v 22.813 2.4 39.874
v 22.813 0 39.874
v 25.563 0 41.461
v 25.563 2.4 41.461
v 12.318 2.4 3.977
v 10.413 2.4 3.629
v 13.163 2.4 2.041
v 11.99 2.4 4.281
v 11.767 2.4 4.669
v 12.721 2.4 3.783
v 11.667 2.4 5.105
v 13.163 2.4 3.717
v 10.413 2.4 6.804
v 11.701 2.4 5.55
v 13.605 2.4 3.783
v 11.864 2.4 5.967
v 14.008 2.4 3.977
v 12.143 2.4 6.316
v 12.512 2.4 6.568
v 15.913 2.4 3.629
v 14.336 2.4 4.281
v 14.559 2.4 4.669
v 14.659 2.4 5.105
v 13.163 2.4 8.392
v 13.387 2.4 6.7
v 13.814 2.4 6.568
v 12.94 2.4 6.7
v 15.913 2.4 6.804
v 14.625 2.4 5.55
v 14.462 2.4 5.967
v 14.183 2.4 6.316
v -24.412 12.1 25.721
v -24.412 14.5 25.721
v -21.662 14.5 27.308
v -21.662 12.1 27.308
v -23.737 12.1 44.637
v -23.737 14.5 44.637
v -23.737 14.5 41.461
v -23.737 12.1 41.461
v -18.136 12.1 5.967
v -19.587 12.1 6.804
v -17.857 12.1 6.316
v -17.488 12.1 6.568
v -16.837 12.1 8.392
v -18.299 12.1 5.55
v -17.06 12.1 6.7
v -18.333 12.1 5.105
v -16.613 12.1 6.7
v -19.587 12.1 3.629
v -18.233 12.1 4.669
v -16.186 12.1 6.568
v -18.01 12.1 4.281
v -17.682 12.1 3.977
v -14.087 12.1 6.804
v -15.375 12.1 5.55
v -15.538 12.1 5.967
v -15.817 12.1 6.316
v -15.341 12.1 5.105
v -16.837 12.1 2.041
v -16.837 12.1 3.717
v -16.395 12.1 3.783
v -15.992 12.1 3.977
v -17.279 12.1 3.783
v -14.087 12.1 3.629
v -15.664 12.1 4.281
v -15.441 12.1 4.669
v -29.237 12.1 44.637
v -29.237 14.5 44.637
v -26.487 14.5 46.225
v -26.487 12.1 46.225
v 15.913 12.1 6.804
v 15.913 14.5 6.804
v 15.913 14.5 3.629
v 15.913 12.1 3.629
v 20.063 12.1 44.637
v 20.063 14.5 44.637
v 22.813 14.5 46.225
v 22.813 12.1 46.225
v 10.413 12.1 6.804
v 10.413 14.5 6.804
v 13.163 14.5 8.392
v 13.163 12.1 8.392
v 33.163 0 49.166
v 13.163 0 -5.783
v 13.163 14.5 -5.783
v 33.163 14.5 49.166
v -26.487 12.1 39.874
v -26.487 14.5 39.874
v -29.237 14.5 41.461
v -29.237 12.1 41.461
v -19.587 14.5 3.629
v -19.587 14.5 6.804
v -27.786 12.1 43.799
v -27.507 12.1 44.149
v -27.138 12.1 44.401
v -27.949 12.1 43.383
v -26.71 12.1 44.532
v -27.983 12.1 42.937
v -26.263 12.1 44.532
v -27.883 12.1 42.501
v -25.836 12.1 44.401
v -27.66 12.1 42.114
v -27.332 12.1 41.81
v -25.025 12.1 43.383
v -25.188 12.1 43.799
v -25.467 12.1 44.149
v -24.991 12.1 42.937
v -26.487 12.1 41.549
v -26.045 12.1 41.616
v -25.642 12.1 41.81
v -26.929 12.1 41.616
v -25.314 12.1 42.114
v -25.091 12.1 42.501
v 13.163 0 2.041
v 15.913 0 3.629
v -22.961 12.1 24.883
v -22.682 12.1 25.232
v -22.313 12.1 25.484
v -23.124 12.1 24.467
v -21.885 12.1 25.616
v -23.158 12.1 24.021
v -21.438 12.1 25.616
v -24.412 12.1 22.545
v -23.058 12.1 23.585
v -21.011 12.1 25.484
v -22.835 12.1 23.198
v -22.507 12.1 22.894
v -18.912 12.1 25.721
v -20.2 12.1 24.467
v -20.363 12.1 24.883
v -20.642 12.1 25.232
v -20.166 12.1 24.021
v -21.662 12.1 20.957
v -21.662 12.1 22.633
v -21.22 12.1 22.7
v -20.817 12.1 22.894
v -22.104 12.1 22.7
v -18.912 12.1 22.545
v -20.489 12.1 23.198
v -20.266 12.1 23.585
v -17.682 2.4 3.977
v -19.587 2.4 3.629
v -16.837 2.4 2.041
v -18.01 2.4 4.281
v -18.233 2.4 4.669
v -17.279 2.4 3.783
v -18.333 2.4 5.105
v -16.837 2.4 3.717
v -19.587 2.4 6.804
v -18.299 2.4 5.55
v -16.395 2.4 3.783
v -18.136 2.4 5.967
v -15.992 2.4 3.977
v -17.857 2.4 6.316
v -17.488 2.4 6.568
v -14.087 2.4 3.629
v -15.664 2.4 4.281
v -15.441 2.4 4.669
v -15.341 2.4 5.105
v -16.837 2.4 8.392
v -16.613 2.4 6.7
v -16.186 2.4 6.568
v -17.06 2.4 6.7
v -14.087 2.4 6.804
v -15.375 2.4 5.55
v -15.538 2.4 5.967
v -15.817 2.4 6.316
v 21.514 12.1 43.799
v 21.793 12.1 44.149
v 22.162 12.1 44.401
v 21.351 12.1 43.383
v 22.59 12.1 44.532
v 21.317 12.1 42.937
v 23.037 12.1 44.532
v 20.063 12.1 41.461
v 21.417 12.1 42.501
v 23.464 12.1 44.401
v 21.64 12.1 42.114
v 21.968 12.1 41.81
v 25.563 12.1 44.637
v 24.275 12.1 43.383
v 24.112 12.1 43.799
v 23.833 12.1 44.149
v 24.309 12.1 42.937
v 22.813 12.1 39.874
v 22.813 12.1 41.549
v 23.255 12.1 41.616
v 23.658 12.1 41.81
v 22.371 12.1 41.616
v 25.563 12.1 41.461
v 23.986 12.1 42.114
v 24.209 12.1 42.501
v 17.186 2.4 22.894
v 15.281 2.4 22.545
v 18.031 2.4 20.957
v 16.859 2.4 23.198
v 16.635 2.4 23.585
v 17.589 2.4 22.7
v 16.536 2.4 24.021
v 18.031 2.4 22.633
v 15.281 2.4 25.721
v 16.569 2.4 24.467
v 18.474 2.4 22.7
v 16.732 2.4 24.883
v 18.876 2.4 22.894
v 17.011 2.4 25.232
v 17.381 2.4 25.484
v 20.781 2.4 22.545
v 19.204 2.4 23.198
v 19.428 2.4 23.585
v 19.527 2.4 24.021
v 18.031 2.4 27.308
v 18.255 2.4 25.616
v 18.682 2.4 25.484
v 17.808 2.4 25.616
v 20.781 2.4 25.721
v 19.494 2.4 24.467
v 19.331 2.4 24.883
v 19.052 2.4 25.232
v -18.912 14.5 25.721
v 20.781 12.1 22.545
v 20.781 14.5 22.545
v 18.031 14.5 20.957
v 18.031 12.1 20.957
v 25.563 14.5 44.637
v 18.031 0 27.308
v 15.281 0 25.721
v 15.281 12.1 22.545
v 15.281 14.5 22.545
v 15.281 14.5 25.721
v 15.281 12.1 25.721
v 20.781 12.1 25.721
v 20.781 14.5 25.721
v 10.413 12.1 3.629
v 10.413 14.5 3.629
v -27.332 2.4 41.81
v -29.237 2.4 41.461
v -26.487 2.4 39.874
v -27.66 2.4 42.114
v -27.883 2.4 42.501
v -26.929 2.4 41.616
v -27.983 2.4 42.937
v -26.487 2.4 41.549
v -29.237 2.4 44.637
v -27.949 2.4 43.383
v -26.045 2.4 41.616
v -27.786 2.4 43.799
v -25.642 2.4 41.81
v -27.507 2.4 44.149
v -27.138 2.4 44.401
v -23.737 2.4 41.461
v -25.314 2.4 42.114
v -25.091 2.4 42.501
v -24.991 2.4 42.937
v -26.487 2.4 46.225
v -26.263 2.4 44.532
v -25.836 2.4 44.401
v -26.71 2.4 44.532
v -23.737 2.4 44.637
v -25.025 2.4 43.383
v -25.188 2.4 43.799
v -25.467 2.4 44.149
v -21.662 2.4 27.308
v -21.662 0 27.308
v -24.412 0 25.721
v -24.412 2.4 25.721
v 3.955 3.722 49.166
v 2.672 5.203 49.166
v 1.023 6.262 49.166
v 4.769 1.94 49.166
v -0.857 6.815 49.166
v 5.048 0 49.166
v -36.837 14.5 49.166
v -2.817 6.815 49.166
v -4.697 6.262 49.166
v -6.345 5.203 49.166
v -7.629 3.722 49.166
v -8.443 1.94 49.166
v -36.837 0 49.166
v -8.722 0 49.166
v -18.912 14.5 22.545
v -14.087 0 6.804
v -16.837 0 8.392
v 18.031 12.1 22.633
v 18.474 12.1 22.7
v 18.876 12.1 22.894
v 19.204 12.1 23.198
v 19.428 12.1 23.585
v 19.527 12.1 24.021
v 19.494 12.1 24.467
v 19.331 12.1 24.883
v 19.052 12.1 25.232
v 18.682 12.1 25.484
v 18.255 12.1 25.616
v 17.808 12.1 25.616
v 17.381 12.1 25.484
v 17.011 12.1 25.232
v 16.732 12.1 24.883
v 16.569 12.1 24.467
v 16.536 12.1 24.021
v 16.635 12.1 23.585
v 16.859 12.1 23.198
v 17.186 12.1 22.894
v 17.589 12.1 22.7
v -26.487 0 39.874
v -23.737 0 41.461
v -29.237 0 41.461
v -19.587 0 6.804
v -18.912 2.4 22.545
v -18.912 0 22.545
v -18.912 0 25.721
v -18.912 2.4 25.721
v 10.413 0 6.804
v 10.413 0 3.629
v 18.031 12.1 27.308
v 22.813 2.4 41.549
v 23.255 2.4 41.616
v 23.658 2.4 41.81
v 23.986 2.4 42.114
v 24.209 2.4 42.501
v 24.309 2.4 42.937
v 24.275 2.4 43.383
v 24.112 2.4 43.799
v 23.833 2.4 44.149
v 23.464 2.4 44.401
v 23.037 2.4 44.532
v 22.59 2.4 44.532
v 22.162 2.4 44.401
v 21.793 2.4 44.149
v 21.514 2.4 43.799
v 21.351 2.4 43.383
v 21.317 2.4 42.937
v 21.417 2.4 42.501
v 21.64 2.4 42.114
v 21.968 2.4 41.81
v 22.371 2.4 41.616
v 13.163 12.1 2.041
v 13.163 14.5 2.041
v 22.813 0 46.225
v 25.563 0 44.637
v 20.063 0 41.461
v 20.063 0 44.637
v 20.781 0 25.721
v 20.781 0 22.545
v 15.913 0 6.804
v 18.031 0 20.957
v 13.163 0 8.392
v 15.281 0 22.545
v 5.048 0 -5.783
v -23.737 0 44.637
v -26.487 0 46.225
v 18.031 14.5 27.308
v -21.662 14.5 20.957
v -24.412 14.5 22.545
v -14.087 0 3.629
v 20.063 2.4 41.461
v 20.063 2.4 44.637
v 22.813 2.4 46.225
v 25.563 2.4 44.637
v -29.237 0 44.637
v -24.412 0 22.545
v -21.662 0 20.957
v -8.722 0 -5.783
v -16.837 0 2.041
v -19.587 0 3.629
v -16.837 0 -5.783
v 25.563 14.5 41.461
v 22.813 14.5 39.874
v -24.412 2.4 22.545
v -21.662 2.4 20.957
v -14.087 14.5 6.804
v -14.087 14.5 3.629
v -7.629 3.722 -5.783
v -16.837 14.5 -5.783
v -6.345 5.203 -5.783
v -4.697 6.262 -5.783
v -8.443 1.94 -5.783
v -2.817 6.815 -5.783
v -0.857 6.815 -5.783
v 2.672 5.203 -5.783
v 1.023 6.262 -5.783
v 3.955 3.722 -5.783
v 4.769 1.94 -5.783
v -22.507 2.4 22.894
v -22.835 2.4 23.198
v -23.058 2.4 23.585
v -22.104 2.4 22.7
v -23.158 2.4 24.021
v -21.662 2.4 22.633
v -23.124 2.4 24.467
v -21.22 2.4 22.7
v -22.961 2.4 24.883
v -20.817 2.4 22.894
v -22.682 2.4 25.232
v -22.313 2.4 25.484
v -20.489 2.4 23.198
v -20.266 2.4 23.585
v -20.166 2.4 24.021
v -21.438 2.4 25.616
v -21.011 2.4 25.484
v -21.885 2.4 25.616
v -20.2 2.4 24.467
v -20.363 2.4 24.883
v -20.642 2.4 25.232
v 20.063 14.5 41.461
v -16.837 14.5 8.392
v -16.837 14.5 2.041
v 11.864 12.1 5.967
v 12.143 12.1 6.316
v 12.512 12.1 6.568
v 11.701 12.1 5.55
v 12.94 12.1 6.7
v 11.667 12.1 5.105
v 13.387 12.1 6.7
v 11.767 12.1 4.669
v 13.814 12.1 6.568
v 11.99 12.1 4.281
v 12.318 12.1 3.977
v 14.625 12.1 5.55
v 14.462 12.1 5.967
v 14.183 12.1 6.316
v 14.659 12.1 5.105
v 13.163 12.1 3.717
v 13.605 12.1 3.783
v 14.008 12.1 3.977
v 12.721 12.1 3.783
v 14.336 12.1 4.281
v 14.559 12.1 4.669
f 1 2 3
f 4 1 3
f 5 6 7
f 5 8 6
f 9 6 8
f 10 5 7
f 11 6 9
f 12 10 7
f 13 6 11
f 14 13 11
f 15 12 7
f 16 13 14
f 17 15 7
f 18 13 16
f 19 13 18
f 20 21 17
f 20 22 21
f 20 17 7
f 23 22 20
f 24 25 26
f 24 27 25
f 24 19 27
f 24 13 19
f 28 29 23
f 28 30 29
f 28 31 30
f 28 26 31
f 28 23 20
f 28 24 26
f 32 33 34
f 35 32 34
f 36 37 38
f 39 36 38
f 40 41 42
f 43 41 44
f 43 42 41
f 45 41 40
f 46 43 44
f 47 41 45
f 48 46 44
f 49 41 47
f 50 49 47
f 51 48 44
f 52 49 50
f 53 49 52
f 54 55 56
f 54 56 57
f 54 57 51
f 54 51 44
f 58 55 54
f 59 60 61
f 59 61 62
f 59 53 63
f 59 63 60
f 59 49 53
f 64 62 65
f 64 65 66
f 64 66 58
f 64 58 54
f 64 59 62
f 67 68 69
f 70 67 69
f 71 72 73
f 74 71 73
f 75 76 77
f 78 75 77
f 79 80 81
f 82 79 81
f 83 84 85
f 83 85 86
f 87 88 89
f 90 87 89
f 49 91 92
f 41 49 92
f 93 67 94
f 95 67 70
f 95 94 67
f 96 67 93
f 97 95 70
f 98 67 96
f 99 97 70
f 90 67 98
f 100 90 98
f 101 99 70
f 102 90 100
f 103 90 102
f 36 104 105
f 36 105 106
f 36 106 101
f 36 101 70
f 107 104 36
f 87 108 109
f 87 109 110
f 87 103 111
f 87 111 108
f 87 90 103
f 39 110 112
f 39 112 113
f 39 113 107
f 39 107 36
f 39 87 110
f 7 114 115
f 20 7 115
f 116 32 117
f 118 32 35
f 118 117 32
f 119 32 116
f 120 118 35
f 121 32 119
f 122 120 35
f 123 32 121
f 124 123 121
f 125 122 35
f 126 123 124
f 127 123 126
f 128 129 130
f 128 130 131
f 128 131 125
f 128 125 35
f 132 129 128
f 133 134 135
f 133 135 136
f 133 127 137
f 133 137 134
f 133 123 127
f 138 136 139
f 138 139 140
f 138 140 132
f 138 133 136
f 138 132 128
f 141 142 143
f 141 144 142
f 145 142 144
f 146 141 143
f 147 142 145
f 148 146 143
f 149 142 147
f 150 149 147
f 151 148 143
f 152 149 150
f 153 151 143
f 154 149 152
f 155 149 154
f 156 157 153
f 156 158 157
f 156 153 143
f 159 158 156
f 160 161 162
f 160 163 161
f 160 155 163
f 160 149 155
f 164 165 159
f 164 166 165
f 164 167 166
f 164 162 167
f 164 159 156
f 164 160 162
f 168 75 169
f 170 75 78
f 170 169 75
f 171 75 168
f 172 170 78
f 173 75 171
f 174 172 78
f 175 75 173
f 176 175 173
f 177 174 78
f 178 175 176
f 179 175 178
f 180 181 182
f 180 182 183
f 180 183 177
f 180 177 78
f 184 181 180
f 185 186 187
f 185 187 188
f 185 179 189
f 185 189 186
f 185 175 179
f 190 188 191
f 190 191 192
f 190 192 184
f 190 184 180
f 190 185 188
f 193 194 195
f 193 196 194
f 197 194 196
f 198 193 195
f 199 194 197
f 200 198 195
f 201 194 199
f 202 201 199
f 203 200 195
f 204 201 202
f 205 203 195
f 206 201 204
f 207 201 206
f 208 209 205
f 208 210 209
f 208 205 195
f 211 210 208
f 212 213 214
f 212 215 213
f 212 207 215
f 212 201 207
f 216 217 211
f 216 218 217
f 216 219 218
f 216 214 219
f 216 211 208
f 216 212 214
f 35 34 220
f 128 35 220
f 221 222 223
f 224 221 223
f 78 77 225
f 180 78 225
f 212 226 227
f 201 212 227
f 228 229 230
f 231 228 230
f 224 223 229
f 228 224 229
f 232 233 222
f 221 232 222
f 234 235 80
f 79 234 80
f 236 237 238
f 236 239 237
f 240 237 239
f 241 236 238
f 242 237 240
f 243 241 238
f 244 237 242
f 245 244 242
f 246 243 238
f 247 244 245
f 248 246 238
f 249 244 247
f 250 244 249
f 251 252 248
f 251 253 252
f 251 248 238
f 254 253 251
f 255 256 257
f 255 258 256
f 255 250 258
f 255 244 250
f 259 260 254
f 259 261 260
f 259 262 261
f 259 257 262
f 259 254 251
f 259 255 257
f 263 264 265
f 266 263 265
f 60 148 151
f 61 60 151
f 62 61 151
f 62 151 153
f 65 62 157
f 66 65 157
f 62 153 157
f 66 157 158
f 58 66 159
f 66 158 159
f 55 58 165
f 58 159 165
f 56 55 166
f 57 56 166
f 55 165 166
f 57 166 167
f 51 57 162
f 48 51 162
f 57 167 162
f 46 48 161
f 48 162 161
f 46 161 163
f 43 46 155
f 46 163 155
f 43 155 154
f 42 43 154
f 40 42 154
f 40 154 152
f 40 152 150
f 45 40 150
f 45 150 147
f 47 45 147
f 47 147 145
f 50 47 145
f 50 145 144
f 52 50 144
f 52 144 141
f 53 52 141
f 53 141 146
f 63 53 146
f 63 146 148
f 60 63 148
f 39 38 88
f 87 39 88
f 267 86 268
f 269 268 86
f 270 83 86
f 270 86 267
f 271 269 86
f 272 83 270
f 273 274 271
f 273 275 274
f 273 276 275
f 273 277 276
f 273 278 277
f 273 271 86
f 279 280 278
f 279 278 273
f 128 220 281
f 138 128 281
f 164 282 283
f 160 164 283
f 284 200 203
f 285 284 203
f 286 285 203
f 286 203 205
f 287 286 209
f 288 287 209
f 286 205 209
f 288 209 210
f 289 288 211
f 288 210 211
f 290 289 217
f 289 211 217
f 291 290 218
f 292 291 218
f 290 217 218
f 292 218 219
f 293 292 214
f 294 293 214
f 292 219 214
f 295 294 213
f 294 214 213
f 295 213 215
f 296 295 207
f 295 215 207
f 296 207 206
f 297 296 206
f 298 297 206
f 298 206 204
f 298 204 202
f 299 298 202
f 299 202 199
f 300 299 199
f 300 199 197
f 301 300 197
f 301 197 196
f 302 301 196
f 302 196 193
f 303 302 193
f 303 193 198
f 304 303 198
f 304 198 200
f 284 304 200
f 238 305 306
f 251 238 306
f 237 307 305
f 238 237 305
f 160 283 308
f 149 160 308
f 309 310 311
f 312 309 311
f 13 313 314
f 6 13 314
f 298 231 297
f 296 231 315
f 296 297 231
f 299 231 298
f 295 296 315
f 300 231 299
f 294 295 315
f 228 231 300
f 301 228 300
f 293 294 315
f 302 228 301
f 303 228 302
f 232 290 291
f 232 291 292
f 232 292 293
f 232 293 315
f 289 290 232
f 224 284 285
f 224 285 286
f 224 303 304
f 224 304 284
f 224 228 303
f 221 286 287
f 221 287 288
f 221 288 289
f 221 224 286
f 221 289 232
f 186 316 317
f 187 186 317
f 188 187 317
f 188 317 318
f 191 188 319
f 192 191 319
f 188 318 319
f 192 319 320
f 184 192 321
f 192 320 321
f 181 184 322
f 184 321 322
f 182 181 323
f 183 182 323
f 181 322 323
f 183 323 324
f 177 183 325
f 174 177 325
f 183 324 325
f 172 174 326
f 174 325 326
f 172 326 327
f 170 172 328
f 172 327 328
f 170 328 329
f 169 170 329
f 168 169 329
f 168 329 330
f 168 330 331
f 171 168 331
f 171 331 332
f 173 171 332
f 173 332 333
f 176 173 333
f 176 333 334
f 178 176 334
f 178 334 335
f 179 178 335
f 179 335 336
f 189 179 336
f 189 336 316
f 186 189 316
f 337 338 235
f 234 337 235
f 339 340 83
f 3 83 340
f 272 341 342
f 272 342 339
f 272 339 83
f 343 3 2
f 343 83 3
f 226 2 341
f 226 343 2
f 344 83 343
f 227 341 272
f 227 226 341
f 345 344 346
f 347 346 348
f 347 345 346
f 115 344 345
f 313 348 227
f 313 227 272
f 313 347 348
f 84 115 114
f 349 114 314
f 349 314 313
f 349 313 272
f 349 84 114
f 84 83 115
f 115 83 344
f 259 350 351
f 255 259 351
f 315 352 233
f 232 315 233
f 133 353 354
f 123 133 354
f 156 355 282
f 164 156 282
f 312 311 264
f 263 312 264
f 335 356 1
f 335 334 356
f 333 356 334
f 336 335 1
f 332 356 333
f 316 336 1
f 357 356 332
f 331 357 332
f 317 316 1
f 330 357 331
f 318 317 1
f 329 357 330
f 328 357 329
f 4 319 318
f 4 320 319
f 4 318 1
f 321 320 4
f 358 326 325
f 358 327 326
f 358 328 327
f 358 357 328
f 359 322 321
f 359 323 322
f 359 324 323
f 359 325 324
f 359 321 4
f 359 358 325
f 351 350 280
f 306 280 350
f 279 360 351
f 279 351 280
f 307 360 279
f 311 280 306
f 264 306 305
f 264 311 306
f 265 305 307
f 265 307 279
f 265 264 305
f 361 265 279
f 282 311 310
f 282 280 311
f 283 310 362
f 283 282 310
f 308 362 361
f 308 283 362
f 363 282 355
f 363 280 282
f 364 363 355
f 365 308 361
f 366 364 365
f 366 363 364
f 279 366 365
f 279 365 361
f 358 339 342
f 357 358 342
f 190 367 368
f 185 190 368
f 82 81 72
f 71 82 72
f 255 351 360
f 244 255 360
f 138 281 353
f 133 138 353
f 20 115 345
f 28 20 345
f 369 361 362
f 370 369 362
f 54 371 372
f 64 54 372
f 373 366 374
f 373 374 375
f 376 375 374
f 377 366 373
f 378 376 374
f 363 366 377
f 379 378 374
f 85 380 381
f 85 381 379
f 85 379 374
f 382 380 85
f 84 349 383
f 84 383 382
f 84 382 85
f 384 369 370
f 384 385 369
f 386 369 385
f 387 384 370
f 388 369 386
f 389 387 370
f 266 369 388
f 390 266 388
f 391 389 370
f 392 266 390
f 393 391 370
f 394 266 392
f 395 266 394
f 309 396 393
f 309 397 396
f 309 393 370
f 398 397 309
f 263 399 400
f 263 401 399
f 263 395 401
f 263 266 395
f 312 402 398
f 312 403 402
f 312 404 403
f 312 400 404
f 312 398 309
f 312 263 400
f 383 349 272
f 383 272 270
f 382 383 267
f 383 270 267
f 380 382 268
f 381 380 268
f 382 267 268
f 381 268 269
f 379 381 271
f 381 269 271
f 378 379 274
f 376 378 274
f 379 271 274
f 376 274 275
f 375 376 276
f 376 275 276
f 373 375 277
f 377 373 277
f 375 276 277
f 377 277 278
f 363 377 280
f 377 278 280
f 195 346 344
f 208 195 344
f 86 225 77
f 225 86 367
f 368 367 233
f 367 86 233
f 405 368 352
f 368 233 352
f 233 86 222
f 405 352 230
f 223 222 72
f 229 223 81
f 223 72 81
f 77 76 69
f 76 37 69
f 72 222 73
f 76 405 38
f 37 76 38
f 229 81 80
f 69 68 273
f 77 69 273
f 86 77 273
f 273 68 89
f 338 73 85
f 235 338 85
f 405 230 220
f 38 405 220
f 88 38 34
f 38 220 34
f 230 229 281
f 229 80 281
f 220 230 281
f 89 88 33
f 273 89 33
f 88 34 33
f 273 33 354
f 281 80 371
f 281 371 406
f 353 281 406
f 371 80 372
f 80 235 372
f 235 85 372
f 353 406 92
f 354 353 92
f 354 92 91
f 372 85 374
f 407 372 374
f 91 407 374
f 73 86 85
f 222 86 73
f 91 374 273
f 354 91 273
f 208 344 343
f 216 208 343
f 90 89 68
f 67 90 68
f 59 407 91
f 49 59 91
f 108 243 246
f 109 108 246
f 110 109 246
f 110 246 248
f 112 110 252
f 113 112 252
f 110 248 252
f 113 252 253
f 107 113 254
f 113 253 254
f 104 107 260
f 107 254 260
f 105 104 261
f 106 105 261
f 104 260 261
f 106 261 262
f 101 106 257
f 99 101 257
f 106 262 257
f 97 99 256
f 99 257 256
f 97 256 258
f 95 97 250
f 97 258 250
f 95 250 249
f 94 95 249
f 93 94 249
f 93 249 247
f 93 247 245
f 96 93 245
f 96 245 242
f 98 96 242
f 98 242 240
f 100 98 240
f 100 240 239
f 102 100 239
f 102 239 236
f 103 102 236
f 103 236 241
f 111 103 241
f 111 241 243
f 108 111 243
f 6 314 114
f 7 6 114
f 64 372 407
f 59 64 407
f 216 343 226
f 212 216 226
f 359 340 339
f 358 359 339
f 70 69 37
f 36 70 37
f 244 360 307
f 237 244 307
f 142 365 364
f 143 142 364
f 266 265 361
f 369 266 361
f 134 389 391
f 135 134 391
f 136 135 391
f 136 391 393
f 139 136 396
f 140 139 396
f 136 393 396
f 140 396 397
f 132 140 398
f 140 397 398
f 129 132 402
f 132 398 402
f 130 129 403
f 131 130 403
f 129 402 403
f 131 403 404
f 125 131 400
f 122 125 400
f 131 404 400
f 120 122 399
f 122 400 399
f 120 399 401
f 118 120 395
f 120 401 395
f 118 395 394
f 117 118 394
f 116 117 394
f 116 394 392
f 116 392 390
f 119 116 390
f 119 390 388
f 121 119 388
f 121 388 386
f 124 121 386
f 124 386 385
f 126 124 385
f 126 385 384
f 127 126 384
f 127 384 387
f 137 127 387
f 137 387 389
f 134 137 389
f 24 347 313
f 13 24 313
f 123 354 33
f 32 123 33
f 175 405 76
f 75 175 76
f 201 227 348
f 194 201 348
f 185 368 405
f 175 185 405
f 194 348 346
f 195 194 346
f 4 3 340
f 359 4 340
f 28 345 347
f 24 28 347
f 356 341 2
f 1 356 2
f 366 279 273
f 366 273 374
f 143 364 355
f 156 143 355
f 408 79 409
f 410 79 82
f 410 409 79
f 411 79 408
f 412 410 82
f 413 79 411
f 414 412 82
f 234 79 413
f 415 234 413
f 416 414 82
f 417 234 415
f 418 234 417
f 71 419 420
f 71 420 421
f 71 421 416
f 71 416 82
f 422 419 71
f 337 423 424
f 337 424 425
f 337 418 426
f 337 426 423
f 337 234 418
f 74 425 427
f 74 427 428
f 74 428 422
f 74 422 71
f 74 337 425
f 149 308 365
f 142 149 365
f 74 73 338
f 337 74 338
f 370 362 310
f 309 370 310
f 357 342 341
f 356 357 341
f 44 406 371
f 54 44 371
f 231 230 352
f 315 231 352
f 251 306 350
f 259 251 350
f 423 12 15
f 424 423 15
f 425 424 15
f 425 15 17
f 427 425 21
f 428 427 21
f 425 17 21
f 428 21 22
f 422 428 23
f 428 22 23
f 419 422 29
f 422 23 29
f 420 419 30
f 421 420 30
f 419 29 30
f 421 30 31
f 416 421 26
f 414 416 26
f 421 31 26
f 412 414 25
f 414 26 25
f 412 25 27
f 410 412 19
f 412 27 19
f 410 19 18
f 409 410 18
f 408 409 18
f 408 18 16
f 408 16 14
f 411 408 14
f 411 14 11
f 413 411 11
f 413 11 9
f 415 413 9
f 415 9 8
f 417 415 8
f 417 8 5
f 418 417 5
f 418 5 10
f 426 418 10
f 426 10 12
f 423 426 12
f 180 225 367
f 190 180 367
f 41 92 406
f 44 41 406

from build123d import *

# Parameters (mm, degrees)
BOSS_EXTRUDE3_DEPTH              = 14.5
SKETCH8_R                        = 6.884606738
CUT_EXTRUDE3_DEPTH               = 88
CUT_EXTRUDE4_DEPTH               = 2.4
CUT_EXTRUDE5_DEPTH               = 2.4
F_39_0_11811024_DIAMETER_HOLE1_D = 3.000000096


with BuildPart() as part:
    # Sketch6 → Boss-Extrude3 (new body)
    with BuildSketch(Plane(origin=(0, 0, 0), x_dir=(1, 0, 0), z_dir=(0, 1, 0))):
        Polygon((-16.836914056, 5.783353512), (13.163085944, 5.783353512), (33.163085944, -49.166194877), (-36.836914056, -49.166194877), align=None)
    extrude(amount=BOSS_EXTRUDE3_DEPTH)

    # Sketch8 → Cut-Extrude3 (cut)
    with BuildSketch(Plane.XY.offset(49.166194877)):
        with Locations((-1.836914056, 0)):
            Circle(SKETCH8_R)
    extrude(amount=-CUT_EXTRUDE3_DEPTH, mode=Mode.SUBTRACT)

    # Sketch9 → Cut-Extrude4 (cut)
    with BuildSketch(Plane(origin=(0, 14.5, 0), x_dir=(1, 0, 0), z_dir=(0, 1, 0))):
        Polygon((-21.661914056, -27.308299801), (-18.911914056, -25.72058656), (-18.911914056, -22.54516008), (-21.661914056, -20.95744684), (-24.411914056, -22.54516008), (-24.411914056, -25.72058656), align=None)
        Polygon((-26.486914056, -46.224526633), (-23.736914056, -44.636813392), (-23.736914056, -41.461386912), (-26.486914056, -39.873673672), (-29.236914056, -41.461386912), (-29.236914056, -44.636813392), align=None)
        Polygon((22.813085944, -46.224526633), (25.563085944, -44.636813392), (25.563085944, -41.461386912), (22.813085944, -39.873673672), (20.063085944, -41.461386912), (20.063085944, -44.636813392), align=None)
        Polygon((18.031463076, -27.308299801), (20.781463076, -25.72058656), (20.781463076, -22.54516008), (18.031463076, -20.95744684), (15.281463076, -22.54516008), (15.281463076, -25.72058656), align=None)
        Polygon((-16.836914056, -8.392072969), (-14.086914056, -6.804359728), (-14.086914056, -3.628933248), (-16.836914056, -2.041220008), (-19.586914056, -3.628933248), (-19.586914056, -6.804359728), align=None)
        Polygon((13.163085944, -8.392072969), (15.913085944, -6.804359728), (15.913085944, -3.628933248), (13.163085944, -2.041220008), (10.413085944, -3.628933248), (10.413085944, -6.804359728), align=None)
    extrude(amount=-CUT_EXTRUDE4_DEPTH, mode=Mode.SUBTRACT)

    # Sketch10 → Cut-Extrude5 (cut)
    with BuildSketch(Plane.XZ):
        Polygon((-26.486914056, 39.873673672), (-23.736914056, 41.461386912), (-23.736914056, 44.636813392), (-26.486914056, 46.224526633), (-29.236914056, 44.636813392), (-29.236914056, 41.461386912), align=None)
        Polygon((-21.661914056, 20.95744684), (-18.911914056, 22.54516008), (-18.911914056, 25.72058656), (-21.661914056, 27.308299801), (-24.411914056, 25.72058656), (-24.411914056, 22.54516008), align=None)
        Polygon((18.031463076, 20.95744684), (20.781463076, 22.54516008), (20.781463076, 25.72058656), (18.031463076, 27.308299801), (15.281463076, 25.72058656), (15.281463076, 22.54516008), align=None)
        Polygon((22.813085944, 39.873673672), (25.563085944, 41.461386912), (25.563085944, 44.636813392), (22.813085944, 46.224526633), (20.063085944, 44.636813392), (20.063085944, 41.461386912), align=None)
        Polygon((-16.836914056, 2.041220008), (-14.086914056, 3.628933248), (-14.086914056, 6.804359728), (-16.836914056, 8.392072969), (-19.586914056, 6.804359728), (-19.586914056, 3.628933248), align=None)
        Polygon((13.163085944, 2.041220008), (15.913085944, 3.628933248), (15.913085944, 6.804359728), (13.163085944, 8.392072969), (10.413085944, 6.804359728), (10.413085944, 3.628933248), align=None)
    extrude(amount=-CUT_EXTRUDE5_DEPTH, mode=Mode.SUBTRACT)

    # #39 (0.11811024) Diameter Hole1 (through all)
    with Locations(Plane(origin=(-16.836914056, 14.5, 5.216646488), x_dir=(0, 0, 1), z_dir=(0, 1, 0))):
        with Locations((0, 0), (0, 30), (18.916226832, 34.868377132), (18.916226832, -4.825), (37.832453664, -9.65), (37.832453664, 39.65)):
            Hole(F_39_0_11811024_DIAMETER_HOLE1_D / 2)


solid = part.part
